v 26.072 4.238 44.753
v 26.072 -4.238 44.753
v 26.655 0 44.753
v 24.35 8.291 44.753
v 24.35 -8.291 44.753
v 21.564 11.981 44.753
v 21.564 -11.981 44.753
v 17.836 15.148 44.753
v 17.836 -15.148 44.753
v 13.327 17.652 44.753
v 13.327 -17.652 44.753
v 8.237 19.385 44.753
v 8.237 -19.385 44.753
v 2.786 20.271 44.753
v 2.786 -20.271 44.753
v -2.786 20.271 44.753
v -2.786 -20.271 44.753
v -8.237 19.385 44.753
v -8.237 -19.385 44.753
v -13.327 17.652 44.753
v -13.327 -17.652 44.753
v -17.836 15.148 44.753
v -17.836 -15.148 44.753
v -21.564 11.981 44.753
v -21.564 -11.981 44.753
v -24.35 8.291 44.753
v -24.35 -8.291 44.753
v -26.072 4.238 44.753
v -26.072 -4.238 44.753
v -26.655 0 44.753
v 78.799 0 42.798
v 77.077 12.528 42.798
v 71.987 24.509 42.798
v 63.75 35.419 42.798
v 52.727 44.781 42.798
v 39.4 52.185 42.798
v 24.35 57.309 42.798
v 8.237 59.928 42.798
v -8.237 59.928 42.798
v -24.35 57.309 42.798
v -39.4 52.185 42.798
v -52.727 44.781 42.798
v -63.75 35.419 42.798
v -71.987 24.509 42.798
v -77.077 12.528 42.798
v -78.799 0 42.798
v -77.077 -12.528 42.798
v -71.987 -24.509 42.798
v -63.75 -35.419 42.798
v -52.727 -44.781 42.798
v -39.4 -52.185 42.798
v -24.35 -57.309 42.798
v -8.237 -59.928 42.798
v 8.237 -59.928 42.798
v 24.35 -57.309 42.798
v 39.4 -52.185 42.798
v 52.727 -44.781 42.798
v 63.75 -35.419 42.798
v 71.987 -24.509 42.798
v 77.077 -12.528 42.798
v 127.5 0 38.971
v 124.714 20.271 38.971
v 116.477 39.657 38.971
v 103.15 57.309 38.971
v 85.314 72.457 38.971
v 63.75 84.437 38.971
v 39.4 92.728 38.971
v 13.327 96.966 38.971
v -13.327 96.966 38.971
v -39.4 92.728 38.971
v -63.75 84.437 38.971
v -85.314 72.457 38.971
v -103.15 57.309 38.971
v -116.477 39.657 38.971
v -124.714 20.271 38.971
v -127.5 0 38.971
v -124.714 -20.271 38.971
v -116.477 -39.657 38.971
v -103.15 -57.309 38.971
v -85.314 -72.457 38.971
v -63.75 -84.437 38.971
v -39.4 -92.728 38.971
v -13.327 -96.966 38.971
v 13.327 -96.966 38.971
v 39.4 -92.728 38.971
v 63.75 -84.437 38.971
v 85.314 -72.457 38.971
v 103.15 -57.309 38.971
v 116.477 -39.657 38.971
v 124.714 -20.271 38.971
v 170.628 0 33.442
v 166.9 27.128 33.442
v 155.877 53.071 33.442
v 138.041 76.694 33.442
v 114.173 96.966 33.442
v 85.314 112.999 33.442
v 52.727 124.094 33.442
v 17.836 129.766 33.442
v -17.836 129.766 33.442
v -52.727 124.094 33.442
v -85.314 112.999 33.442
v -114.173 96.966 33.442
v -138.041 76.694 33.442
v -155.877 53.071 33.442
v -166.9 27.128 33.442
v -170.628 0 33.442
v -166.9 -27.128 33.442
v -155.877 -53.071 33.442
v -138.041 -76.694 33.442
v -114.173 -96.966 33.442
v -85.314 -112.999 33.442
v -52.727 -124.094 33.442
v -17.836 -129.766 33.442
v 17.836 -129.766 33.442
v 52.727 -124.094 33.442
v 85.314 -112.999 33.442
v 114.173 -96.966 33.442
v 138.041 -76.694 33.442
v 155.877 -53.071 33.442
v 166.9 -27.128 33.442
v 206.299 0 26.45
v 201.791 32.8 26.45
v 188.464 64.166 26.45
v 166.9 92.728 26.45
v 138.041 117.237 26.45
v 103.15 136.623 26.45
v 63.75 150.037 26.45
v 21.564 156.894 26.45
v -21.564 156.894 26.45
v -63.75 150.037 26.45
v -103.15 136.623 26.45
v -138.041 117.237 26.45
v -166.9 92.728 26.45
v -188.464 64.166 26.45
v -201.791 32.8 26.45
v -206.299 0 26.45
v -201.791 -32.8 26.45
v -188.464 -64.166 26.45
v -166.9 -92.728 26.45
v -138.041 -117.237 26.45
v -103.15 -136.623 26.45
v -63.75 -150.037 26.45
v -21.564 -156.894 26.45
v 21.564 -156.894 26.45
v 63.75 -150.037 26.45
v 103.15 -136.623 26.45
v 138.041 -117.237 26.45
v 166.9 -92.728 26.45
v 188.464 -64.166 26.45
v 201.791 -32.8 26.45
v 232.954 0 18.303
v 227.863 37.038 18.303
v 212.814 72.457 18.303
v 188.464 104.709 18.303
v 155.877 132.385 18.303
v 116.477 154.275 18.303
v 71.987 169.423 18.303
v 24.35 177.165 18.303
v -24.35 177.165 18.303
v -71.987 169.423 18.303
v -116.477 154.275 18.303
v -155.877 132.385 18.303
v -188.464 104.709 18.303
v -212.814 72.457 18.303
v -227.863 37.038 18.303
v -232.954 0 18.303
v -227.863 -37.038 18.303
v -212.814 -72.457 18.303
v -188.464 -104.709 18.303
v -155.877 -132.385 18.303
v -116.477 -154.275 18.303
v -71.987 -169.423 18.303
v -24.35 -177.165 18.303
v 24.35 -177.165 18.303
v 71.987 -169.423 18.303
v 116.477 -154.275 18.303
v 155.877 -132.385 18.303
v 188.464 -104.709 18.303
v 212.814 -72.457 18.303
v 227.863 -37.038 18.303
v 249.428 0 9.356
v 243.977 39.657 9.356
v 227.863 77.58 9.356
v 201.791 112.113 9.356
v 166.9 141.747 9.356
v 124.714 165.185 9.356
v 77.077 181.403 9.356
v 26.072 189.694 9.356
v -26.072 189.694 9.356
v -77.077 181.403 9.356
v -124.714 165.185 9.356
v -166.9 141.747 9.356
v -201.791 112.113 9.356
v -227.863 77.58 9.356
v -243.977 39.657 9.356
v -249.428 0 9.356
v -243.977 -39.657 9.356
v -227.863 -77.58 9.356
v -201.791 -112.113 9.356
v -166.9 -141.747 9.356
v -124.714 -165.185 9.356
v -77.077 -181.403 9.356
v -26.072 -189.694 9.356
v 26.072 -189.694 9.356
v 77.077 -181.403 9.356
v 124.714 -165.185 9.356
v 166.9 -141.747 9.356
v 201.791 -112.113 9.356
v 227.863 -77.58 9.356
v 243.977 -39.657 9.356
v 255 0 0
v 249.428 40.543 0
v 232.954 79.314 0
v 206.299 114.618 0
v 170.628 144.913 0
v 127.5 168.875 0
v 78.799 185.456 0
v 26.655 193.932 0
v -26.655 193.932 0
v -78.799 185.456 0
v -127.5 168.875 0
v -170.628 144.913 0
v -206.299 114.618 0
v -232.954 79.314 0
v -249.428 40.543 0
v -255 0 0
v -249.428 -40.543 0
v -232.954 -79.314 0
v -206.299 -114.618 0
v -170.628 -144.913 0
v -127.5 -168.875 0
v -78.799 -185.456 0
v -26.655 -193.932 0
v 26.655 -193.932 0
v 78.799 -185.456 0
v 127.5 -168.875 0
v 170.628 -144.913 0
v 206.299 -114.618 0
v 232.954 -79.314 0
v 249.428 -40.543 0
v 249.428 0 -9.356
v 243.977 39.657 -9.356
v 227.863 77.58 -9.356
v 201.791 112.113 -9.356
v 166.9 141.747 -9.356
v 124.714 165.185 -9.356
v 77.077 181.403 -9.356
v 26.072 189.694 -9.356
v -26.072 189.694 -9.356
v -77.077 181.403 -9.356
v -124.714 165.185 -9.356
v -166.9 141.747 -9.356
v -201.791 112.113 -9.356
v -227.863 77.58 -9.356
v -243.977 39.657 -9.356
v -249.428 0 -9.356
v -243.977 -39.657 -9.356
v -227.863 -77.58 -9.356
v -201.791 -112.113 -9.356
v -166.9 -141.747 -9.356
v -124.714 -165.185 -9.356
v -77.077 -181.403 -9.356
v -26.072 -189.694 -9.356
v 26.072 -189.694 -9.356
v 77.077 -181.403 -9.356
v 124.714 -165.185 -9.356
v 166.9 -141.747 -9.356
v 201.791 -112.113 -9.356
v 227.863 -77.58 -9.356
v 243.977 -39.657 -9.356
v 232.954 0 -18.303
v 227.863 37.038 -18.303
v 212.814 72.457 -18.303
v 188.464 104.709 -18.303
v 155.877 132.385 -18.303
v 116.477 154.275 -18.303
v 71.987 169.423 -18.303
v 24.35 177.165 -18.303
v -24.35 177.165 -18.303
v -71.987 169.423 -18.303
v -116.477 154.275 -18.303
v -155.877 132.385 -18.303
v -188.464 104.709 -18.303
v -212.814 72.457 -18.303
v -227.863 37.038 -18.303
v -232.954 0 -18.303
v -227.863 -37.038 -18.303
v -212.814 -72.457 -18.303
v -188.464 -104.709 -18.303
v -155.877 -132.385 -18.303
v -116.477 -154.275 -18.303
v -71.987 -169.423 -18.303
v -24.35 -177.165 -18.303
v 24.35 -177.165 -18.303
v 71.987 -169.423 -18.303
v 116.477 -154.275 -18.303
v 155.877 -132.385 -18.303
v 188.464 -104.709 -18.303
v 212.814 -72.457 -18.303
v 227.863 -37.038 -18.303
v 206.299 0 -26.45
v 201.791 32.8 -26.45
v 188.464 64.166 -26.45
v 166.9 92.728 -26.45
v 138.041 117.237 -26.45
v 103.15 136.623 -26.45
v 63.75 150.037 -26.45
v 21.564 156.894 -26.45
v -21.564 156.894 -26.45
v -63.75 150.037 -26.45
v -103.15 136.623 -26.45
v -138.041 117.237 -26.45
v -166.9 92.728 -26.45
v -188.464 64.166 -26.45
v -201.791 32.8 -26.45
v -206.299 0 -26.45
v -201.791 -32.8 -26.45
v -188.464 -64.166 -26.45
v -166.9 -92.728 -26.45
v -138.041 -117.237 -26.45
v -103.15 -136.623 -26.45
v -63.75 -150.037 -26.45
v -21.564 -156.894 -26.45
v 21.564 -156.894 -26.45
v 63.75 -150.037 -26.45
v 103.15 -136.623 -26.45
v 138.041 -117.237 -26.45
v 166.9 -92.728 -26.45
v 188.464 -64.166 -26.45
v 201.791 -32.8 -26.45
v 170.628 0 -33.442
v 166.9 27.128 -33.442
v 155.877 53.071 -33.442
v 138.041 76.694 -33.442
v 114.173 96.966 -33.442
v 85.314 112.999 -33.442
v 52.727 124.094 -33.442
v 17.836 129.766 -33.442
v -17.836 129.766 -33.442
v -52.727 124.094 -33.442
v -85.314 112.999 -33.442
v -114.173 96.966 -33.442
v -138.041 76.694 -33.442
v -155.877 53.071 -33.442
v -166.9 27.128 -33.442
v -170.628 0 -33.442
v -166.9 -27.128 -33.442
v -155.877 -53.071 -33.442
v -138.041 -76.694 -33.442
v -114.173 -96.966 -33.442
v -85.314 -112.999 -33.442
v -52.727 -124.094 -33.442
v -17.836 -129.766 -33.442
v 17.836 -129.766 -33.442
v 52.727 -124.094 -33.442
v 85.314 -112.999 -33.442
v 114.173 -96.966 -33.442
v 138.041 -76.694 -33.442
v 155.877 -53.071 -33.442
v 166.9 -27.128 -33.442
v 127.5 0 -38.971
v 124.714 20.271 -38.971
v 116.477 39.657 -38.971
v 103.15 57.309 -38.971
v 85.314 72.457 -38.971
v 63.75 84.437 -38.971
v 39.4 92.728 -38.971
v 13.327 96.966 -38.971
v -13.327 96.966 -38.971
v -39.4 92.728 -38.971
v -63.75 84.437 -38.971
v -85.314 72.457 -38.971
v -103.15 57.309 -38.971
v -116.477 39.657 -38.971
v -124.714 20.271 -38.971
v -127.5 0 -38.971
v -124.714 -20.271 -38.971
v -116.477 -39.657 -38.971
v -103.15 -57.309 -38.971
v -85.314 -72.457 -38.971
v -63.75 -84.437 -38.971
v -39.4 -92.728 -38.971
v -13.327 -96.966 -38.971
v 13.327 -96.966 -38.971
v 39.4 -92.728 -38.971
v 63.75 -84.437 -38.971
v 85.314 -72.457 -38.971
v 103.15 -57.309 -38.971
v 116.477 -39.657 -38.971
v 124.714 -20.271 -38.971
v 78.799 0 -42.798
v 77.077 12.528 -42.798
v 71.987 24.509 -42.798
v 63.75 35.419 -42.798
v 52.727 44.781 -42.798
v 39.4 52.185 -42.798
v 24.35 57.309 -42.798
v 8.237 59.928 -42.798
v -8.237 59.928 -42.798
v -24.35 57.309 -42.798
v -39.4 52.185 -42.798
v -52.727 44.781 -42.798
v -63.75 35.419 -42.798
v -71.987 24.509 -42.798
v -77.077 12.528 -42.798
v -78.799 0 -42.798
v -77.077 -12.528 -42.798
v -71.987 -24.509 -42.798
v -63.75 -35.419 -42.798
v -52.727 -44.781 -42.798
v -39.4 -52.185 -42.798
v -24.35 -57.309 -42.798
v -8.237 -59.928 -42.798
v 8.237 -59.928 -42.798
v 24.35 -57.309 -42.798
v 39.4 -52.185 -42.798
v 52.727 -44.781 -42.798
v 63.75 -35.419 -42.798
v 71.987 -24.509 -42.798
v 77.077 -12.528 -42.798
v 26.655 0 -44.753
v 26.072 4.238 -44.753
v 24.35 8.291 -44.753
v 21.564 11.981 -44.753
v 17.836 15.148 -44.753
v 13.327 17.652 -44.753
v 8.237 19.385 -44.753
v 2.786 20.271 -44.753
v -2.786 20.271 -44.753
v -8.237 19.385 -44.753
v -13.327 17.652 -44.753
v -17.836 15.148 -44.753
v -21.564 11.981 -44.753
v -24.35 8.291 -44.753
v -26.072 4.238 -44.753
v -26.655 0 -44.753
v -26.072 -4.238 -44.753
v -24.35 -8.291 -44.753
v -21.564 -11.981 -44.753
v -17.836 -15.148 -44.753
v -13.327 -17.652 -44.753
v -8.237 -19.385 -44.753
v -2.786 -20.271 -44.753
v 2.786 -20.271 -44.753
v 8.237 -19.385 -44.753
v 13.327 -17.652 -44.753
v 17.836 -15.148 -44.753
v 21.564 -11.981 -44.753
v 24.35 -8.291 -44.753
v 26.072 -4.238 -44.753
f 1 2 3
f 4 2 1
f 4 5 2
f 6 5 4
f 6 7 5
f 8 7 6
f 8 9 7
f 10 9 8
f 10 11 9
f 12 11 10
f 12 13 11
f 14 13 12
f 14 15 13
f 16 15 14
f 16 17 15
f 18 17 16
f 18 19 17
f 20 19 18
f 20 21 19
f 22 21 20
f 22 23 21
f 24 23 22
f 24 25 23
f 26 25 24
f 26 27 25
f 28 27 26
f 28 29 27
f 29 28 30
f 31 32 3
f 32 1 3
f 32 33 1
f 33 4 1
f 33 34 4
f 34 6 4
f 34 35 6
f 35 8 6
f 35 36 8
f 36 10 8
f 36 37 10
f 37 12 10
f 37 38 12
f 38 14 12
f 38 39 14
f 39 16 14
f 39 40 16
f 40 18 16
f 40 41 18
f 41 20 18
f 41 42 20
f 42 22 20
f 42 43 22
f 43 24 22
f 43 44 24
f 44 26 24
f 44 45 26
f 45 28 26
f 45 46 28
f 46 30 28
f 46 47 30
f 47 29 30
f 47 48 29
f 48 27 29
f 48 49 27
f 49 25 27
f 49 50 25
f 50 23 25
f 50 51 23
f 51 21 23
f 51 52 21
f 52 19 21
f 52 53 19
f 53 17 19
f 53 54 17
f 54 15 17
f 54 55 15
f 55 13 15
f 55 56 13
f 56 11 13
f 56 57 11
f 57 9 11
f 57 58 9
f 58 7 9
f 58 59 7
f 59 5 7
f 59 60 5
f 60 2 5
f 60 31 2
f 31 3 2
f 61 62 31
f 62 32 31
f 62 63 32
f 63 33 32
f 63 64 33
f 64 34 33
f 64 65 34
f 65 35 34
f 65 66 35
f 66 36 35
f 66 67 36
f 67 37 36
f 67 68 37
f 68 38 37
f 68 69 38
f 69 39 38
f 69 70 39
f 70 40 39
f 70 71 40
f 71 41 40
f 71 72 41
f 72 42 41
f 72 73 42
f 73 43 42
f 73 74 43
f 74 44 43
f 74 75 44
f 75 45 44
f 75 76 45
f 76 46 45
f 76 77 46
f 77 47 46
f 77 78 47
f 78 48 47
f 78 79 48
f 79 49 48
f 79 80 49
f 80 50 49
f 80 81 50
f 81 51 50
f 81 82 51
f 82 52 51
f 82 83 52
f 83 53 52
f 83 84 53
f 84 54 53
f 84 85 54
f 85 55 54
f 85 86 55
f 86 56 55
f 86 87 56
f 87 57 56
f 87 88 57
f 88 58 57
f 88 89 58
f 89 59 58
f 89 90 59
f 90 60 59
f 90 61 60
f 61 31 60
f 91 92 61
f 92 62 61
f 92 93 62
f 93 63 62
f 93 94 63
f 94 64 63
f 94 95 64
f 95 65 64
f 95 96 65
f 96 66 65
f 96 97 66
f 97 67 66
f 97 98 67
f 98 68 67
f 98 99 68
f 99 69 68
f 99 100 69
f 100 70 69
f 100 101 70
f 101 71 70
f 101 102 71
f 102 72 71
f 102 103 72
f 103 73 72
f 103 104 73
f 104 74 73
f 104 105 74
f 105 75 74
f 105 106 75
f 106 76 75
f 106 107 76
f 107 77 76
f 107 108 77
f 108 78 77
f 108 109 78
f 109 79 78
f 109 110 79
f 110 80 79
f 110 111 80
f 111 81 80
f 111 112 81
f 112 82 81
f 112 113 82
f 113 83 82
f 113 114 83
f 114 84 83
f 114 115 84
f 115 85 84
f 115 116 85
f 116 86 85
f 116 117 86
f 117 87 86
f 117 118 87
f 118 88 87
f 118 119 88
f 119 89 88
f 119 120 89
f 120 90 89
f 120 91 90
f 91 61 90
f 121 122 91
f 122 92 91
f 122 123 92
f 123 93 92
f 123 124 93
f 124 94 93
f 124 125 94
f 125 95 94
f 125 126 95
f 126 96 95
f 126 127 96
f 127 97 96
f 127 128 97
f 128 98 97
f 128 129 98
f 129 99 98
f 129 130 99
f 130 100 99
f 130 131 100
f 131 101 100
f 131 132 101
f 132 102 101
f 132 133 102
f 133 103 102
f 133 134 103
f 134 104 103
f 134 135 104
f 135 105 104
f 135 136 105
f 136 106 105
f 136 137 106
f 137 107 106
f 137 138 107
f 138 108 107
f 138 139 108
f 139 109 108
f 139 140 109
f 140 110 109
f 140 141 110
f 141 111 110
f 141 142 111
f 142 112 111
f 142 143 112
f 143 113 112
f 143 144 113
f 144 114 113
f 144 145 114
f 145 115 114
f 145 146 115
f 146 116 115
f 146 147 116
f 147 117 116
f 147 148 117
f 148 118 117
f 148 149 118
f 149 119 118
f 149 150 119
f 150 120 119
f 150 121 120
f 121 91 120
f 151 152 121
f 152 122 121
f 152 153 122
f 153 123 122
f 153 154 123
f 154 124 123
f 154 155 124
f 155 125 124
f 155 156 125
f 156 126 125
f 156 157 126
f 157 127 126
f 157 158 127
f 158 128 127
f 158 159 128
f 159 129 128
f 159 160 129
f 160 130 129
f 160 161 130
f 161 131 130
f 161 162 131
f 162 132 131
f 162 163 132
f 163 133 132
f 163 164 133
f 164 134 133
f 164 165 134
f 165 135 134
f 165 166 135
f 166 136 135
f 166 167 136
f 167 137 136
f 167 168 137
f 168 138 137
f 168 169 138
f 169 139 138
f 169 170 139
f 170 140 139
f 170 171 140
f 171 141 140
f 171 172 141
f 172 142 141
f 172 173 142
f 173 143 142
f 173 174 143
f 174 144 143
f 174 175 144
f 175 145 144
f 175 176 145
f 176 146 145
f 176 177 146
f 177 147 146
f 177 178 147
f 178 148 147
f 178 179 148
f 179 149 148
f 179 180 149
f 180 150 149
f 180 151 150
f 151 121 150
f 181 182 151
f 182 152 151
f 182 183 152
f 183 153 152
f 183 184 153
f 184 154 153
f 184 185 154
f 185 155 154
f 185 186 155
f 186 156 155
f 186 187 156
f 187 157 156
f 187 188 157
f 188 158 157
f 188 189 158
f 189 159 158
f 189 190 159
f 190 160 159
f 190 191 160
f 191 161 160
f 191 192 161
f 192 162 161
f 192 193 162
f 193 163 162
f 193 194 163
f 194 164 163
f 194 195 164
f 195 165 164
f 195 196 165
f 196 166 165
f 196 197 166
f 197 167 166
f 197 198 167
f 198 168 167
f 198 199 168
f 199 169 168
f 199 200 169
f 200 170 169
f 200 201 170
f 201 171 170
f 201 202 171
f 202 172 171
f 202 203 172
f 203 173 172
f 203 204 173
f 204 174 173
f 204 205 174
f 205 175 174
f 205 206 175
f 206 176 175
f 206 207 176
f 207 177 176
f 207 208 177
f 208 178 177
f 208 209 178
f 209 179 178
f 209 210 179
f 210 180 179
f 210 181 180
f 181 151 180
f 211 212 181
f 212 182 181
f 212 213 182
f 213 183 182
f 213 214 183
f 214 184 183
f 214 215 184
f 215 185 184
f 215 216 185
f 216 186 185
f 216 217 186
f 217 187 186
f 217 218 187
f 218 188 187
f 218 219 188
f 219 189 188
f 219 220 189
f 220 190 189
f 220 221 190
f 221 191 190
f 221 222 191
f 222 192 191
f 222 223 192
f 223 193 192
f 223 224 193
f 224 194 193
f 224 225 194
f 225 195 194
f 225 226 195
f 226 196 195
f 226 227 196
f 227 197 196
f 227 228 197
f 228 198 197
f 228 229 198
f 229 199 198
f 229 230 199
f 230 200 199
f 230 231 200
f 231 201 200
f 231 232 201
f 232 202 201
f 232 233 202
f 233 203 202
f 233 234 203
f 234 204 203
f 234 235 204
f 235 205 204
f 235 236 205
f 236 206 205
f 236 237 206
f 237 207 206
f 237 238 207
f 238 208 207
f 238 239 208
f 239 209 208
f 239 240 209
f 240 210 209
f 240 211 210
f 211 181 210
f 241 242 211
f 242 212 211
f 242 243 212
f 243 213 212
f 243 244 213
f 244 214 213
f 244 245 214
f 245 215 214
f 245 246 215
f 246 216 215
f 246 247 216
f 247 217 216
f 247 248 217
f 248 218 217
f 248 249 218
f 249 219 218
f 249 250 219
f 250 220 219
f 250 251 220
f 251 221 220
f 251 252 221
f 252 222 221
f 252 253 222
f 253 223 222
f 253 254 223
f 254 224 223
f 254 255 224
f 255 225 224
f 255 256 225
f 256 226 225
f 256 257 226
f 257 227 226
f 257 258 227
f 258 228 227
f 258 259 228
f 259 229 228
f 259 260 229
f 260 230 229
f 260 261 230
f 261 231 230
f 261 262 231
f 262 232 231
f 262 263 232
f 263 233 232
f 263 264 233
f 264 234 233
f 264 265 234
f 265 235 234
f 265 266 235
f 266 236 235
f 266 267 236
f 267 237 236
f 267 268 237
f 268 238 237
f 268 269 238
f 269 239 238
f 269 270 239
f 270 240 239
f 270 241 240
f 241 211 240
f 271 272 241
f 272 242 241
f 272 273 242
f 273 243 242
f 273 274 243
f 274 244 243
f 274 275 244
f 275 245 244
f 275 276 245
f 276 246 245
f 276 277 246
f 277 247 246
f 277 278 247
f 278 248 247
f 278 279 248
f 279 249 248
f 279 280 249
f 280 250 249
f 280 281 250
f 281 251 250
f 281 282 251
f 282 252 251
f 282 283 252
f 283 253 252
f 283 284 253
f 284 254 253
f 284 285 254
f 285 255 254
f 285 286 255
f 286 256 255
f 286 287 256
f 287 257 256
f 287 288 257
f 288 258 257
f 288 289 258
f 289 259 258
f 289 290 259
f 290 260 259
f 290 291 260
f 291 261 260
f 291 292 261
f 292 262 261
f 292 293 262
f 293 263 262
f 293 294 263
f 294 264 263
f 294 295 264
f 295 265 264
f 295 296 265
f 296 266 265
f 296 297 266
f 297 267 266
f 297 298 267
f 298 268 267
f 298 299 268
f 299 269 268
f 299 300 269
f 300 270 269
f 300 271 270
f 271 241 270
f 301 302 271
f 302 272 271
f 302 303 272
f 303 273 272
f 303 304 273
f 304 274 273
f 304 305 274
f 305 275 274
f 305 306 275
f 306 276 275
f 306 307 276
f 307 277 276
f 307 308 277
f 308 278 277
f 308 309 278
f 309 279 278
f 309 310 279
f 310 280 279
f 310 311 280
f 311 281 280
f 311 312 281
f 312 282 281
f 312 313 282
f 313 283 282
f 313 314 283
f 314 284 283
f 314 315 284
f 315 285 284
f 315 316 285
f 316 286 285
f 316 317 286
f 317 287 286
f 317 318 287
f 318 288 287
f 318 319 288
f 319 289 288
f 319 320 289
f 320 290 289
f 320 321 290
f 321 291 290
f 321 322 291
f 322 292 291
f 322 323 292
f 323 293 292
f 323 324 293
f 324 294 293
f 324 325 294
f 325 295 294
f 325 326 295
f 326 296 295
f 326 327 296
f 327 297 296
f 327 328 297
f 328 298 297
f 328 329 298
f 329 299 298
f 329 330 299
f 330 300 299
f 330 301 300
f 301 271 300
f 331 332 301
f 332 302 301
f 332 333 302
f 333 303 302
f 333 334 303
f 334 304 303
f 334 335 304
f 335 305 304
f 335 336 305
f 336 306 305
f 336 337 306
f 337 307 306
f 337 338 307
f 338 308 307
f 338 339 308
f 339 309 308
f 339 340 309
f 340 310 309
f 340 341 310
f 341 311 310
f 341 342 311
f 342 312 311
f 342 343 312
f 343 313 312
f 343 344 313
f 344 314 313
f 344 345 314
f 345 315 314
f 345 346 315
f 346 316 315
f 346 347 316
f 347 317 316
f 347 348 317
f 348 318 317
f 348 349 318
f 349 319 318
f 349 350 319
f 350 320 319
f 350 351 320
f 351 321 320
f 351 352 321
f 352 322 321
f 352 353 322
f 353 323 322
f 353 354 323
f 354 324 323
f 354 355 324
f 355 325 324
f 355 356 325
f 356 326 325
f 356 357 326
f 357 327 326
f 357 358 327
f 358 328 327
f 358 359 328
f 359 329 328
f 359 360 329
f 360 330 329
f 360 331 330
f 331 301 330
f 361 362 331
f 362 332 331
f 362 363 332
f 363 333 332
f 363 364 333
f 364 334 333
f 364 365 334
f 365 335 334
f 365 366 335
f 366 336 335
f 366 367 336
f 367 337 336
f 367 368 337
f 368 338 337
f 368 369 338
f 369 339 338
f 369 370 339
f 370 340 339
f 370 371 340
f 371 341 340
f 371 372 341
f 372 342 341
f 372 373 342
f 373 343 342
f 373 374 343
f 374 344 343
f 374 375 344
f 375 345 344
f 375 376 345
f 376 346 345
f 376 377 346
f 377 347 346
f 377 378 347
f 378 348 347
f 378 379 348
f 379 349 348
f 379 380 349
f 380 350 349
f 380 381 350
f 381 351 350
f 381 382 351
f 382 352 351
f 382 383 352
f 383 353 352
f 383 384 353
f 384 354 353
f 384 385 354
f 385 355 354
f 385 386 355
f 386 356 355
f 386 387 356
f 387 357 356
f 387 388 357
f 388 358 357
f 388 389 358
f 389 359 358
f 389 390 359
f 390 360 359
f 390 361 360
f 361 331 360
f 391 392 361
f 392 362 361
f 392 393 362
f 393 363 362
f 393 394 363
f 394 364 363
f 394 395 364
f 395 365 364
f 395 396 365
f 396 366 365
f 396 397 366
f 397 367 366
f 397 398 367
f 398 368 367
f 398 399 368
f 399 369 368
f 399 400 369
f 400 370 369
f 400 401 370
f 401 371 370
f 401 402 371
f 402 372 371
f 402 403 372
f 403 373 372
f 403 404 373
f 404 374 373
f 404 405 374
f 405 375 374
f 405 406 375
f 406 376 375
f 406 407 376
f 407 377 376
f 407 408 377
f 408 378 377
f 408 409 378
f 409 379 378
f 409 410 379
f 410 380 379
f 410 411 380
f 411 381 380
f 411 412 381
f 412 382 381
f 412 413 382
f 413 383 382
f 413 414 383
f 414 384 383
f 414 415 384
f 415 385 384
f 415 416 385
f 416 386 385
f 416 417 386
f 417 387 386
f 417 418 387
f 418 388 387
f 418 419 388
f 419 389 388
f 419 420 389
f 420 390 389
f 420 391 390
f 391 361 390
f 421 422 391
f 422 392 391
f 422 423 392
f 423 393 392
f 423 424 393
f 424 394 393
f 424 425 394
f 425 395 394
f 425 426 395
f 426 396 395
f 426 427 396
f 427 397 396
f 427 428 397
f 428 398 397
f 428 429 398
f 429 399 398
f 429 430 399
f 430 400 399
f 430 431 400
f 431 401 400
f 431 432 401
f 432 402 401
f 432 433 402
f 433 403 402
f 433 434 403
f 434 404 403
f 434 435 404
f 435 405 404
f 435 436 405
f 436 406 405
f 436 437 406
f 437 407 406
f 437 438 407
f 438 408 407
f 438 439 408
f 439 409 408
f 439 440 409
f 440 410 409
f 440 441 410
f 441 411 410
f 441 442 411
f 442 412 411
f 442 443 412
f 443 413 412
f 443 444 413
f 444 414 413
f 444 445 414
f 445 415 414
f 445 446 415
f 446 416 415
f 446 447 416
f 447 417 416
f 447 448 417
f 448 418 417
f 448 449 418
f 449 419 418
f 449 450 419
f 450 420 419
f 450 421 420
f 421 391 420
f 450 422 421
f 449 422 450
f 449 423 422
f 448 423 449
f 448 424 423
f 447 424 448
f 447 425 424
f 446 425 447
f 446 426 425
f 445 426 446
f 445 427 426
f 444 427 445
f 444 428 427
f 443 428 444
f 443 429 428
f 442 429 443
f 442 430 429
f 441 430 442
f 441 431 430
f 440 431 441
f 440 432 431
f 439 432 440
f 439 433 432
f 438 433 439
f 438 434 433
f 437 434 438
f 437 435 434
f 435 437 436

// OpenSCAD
// Generated by SolidPython 1.0.1 on 2020-07-29 00:46:53


scale(v = [17, 13, 3]) {
	sphere(r = 15);
}
/***********************************************
*********      SolidPython code:      **********
************************************************
 
# import packages: SolidPython
from solid import *
from solid.utils import *
from itertools import chain, combinations, permutations


class Resize:

    def __init__(self, scad_file):
        self.scad_file = scad_file
        #self.scad_file = import_scad(scad_file)
        # cone/cylinder param:
        self.r1 = 0
        self.r2 = 0
        self.h = 0
        # rectangular prism param:
        self.w = 0
        self.l = 0
        # ellipse param:
        self.r = 0

    # import OpenScad code (file name corresponds to shape)


    # classify shape + parameters
    def assign(self, param1, param2, param3):
        if self.scad_file == 'cone.scad':
            self.r1 = param1
            self.r2 = param2
            self.h = param3
        elif self.scad_file == 'cylinder.scad':
            self.r1 = param1
            self.r2 = param2
            self.h = param3
        elif self.scad_file == 'rectangularPrism.scad':
            self.h = param1
            self.l = param2
            self.w = param3
        else:
            self.r = param1
            self.h = param2

    # resize parameters
    def iterate(self):
        x = range(3, 20, 2)
        i = 1
        if self.scad_file == 'cone.scad':
            tempList = list(permutations(x, 2))
            for temp in tempList:
                param1 = temp[0]
                param2 = temp[1]
                filepath = 'produced_scad_files/' + 'cone' + str(param1) + '_' + str(param2) + '_' + '.scad'
                scad_render_to_file(cylinder(h=param1, r1=param2, r2=0), filepath)

        elif self.scad_file == 'cylinder.scad':
            tempList = list(permutations(x, 3))
            for temp in tempList:
                param1 = temp[0]
                param2 = temp[1]
                filepath = 'produced_scad_files/' + 'cylinder' + str(param1) + '_' + str(param2) + '_' + '.scad'
                scad_render_to_file(cylinder(h=param1, r1=param2, r2=param2), filepath)

        elif self.scad_file == 'rectangularPrism.scad':
            tempList = list(permutations(x, 3))
            for temp in tempList:
                param1 = temp[0]
                param2 = temp[1]
                param3 = temp[2]
                filepath = 'produced_scad_files/' + 'rectangularPrism' + str(param1) + '_' + str(param2) + '_' + str(
                    param3) + '.scad'
                scad_render_to_file(cube(size=(param1, param2, param3)), filepath)

        elif self.scad_file == 'ellipse.scad':
            tempList = list(permutations(x, 4))
            for temp in tempList:
                param1 = temp[0]
                param2 = temp[1]
                param3 = temp[2]
                param4 = temp[3]
                filepath = 'produced_scad_files/' + 'ellipse' + str(param1) + '_' + str(param2) + '_' + str(param3) + '_' + str(param4) + '.scad'
                scad_render_to_file(scale([param1, param2, param3])(sphere(r=param4)), filepath)

    def render_to_scadfile(self):
        scad_render_to_file(scad, 'example.scad') 
 
************************************************/
